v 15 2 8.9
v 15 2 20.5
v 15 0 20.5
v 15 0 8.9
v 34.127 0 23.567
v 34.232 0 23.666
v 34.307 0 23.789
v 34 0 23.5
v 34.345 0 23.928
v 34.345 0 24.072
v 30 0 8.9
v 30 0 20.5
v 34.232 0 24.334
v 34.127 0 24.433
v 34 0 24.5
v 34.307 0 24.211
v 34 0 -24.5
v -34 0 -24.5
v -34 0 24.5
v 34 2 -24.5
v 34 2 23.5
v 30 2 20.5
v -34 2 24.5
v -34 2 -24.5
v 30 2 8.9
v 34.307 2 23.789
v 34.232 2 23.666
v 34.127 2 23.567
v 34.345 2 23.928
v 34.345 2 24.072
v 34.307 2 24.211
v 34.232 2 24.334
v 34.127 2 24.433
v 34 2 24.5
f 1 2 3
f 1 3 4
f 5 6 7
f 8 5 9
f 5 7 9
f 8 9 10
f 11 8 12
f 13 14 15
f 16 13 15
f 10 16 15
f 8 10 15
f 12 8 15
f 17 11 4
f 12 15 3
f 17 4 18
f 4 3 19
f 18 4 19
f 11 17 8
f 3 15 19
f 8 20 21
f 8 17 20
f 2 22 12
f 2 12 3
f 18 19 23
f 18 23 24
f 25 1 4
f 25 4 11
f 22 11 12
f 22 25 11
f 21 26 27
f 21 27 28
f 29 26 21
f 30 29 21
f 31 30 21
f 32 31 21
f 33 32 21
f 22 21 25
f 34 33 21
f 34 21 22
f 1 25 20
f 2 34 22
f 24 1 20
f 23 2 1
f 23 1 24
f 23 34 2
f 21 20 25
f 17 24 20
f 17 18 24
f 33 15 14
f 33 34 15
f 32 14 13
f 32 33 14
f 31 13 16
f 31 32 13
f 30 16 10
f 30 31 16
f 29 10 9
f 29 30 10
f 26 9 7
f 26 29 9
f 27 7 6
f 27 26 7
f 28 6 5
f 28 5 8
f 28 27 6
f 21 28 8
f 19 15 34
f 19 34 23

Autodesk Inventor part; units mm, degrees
ref_plane "YZ Plane" through (0, 0, 0) normal (1, 0, 0) x (0, 1, 0)
ref_plane "XZ Plane" through (0, 0, 0) normal (0, 1, 0) x (-1, 0, 0)
ref_plane "XY Plane" through (0, 0, 0) normal (0, 0, 1) x (1, 0, 0)
sketch "Sketch1" plane through (0, 0, 0) normal (0, 1, 0) x (-1, 0, 0)
  line L0 (-34, 24.5) -> (34, 24.5)
  line L1 (34, 24.5) -> (34, -24.5)
  line L2 (34, -24.5) -> (-34, -24.5)
  line L3 (-34, -24.5) -> (-34, 24.5)
  line L4 (-34, 24.5) -> (34, -24.5) construction
  line L5 (34, 24.5) -> (-34, -24.5) construction
  point P0 (0, 0)
  dimension "d0" = 49
  dimension "d1" = 68
extrude "Extrusion1" add sketch "Sketch1" along normal blind 2
sketch "Sketch3" plane through (0, 2, 0) normal (0, 1, 0) x (1, 0, 0)
  line L0 (-34, -24.5) -> (34, -24.5) projected
  line L1 (34, -24.5) -> (34, 24.5) projected
  arc A0 (34, -24.5) -> (34, -23.5) centre (33.818, -24) ccw
  point P0 (0, 0)
  dimension "d6" = 1
  dimension "d9" = 140
extrude "Extrusion2" add sketch "Sketch3" against normal blind 2
sketch "Sketch4" plane through (0, 2, 0) normal (0, 1, 0) x (1, 0, 0)
  line L0 (15, -8.9) -> (30, -8.9)
  line L1 (30, -8.9) -> (30, -20.5)
  line L2 (30, -20.5) -> (15, -20.5)
  line L3 (15, -20.5) -> (15, -8.9)
  line L4 (15, -8.9) -> (30, -20.5) construction
  line L5 (30, -8.9) -> (15, -20.5) construction
  line L6 (34, -23.5) -> (34, 24.5) projected
  line L7 (-34, -24.5) -> (34, -24.5) projected
  point P0 (0, 0)
  point P1 (22.5, -14.7)
  dimension "d12" = 15
  dimension "d13" = 11.6
  dimension "d14" = 4
  dimension "d15" = 4
extrude "Extrusion3" cut sketch "Sketch4" against normal blind 10
properties part number "side_lid_yes_hole_3DPrint"
